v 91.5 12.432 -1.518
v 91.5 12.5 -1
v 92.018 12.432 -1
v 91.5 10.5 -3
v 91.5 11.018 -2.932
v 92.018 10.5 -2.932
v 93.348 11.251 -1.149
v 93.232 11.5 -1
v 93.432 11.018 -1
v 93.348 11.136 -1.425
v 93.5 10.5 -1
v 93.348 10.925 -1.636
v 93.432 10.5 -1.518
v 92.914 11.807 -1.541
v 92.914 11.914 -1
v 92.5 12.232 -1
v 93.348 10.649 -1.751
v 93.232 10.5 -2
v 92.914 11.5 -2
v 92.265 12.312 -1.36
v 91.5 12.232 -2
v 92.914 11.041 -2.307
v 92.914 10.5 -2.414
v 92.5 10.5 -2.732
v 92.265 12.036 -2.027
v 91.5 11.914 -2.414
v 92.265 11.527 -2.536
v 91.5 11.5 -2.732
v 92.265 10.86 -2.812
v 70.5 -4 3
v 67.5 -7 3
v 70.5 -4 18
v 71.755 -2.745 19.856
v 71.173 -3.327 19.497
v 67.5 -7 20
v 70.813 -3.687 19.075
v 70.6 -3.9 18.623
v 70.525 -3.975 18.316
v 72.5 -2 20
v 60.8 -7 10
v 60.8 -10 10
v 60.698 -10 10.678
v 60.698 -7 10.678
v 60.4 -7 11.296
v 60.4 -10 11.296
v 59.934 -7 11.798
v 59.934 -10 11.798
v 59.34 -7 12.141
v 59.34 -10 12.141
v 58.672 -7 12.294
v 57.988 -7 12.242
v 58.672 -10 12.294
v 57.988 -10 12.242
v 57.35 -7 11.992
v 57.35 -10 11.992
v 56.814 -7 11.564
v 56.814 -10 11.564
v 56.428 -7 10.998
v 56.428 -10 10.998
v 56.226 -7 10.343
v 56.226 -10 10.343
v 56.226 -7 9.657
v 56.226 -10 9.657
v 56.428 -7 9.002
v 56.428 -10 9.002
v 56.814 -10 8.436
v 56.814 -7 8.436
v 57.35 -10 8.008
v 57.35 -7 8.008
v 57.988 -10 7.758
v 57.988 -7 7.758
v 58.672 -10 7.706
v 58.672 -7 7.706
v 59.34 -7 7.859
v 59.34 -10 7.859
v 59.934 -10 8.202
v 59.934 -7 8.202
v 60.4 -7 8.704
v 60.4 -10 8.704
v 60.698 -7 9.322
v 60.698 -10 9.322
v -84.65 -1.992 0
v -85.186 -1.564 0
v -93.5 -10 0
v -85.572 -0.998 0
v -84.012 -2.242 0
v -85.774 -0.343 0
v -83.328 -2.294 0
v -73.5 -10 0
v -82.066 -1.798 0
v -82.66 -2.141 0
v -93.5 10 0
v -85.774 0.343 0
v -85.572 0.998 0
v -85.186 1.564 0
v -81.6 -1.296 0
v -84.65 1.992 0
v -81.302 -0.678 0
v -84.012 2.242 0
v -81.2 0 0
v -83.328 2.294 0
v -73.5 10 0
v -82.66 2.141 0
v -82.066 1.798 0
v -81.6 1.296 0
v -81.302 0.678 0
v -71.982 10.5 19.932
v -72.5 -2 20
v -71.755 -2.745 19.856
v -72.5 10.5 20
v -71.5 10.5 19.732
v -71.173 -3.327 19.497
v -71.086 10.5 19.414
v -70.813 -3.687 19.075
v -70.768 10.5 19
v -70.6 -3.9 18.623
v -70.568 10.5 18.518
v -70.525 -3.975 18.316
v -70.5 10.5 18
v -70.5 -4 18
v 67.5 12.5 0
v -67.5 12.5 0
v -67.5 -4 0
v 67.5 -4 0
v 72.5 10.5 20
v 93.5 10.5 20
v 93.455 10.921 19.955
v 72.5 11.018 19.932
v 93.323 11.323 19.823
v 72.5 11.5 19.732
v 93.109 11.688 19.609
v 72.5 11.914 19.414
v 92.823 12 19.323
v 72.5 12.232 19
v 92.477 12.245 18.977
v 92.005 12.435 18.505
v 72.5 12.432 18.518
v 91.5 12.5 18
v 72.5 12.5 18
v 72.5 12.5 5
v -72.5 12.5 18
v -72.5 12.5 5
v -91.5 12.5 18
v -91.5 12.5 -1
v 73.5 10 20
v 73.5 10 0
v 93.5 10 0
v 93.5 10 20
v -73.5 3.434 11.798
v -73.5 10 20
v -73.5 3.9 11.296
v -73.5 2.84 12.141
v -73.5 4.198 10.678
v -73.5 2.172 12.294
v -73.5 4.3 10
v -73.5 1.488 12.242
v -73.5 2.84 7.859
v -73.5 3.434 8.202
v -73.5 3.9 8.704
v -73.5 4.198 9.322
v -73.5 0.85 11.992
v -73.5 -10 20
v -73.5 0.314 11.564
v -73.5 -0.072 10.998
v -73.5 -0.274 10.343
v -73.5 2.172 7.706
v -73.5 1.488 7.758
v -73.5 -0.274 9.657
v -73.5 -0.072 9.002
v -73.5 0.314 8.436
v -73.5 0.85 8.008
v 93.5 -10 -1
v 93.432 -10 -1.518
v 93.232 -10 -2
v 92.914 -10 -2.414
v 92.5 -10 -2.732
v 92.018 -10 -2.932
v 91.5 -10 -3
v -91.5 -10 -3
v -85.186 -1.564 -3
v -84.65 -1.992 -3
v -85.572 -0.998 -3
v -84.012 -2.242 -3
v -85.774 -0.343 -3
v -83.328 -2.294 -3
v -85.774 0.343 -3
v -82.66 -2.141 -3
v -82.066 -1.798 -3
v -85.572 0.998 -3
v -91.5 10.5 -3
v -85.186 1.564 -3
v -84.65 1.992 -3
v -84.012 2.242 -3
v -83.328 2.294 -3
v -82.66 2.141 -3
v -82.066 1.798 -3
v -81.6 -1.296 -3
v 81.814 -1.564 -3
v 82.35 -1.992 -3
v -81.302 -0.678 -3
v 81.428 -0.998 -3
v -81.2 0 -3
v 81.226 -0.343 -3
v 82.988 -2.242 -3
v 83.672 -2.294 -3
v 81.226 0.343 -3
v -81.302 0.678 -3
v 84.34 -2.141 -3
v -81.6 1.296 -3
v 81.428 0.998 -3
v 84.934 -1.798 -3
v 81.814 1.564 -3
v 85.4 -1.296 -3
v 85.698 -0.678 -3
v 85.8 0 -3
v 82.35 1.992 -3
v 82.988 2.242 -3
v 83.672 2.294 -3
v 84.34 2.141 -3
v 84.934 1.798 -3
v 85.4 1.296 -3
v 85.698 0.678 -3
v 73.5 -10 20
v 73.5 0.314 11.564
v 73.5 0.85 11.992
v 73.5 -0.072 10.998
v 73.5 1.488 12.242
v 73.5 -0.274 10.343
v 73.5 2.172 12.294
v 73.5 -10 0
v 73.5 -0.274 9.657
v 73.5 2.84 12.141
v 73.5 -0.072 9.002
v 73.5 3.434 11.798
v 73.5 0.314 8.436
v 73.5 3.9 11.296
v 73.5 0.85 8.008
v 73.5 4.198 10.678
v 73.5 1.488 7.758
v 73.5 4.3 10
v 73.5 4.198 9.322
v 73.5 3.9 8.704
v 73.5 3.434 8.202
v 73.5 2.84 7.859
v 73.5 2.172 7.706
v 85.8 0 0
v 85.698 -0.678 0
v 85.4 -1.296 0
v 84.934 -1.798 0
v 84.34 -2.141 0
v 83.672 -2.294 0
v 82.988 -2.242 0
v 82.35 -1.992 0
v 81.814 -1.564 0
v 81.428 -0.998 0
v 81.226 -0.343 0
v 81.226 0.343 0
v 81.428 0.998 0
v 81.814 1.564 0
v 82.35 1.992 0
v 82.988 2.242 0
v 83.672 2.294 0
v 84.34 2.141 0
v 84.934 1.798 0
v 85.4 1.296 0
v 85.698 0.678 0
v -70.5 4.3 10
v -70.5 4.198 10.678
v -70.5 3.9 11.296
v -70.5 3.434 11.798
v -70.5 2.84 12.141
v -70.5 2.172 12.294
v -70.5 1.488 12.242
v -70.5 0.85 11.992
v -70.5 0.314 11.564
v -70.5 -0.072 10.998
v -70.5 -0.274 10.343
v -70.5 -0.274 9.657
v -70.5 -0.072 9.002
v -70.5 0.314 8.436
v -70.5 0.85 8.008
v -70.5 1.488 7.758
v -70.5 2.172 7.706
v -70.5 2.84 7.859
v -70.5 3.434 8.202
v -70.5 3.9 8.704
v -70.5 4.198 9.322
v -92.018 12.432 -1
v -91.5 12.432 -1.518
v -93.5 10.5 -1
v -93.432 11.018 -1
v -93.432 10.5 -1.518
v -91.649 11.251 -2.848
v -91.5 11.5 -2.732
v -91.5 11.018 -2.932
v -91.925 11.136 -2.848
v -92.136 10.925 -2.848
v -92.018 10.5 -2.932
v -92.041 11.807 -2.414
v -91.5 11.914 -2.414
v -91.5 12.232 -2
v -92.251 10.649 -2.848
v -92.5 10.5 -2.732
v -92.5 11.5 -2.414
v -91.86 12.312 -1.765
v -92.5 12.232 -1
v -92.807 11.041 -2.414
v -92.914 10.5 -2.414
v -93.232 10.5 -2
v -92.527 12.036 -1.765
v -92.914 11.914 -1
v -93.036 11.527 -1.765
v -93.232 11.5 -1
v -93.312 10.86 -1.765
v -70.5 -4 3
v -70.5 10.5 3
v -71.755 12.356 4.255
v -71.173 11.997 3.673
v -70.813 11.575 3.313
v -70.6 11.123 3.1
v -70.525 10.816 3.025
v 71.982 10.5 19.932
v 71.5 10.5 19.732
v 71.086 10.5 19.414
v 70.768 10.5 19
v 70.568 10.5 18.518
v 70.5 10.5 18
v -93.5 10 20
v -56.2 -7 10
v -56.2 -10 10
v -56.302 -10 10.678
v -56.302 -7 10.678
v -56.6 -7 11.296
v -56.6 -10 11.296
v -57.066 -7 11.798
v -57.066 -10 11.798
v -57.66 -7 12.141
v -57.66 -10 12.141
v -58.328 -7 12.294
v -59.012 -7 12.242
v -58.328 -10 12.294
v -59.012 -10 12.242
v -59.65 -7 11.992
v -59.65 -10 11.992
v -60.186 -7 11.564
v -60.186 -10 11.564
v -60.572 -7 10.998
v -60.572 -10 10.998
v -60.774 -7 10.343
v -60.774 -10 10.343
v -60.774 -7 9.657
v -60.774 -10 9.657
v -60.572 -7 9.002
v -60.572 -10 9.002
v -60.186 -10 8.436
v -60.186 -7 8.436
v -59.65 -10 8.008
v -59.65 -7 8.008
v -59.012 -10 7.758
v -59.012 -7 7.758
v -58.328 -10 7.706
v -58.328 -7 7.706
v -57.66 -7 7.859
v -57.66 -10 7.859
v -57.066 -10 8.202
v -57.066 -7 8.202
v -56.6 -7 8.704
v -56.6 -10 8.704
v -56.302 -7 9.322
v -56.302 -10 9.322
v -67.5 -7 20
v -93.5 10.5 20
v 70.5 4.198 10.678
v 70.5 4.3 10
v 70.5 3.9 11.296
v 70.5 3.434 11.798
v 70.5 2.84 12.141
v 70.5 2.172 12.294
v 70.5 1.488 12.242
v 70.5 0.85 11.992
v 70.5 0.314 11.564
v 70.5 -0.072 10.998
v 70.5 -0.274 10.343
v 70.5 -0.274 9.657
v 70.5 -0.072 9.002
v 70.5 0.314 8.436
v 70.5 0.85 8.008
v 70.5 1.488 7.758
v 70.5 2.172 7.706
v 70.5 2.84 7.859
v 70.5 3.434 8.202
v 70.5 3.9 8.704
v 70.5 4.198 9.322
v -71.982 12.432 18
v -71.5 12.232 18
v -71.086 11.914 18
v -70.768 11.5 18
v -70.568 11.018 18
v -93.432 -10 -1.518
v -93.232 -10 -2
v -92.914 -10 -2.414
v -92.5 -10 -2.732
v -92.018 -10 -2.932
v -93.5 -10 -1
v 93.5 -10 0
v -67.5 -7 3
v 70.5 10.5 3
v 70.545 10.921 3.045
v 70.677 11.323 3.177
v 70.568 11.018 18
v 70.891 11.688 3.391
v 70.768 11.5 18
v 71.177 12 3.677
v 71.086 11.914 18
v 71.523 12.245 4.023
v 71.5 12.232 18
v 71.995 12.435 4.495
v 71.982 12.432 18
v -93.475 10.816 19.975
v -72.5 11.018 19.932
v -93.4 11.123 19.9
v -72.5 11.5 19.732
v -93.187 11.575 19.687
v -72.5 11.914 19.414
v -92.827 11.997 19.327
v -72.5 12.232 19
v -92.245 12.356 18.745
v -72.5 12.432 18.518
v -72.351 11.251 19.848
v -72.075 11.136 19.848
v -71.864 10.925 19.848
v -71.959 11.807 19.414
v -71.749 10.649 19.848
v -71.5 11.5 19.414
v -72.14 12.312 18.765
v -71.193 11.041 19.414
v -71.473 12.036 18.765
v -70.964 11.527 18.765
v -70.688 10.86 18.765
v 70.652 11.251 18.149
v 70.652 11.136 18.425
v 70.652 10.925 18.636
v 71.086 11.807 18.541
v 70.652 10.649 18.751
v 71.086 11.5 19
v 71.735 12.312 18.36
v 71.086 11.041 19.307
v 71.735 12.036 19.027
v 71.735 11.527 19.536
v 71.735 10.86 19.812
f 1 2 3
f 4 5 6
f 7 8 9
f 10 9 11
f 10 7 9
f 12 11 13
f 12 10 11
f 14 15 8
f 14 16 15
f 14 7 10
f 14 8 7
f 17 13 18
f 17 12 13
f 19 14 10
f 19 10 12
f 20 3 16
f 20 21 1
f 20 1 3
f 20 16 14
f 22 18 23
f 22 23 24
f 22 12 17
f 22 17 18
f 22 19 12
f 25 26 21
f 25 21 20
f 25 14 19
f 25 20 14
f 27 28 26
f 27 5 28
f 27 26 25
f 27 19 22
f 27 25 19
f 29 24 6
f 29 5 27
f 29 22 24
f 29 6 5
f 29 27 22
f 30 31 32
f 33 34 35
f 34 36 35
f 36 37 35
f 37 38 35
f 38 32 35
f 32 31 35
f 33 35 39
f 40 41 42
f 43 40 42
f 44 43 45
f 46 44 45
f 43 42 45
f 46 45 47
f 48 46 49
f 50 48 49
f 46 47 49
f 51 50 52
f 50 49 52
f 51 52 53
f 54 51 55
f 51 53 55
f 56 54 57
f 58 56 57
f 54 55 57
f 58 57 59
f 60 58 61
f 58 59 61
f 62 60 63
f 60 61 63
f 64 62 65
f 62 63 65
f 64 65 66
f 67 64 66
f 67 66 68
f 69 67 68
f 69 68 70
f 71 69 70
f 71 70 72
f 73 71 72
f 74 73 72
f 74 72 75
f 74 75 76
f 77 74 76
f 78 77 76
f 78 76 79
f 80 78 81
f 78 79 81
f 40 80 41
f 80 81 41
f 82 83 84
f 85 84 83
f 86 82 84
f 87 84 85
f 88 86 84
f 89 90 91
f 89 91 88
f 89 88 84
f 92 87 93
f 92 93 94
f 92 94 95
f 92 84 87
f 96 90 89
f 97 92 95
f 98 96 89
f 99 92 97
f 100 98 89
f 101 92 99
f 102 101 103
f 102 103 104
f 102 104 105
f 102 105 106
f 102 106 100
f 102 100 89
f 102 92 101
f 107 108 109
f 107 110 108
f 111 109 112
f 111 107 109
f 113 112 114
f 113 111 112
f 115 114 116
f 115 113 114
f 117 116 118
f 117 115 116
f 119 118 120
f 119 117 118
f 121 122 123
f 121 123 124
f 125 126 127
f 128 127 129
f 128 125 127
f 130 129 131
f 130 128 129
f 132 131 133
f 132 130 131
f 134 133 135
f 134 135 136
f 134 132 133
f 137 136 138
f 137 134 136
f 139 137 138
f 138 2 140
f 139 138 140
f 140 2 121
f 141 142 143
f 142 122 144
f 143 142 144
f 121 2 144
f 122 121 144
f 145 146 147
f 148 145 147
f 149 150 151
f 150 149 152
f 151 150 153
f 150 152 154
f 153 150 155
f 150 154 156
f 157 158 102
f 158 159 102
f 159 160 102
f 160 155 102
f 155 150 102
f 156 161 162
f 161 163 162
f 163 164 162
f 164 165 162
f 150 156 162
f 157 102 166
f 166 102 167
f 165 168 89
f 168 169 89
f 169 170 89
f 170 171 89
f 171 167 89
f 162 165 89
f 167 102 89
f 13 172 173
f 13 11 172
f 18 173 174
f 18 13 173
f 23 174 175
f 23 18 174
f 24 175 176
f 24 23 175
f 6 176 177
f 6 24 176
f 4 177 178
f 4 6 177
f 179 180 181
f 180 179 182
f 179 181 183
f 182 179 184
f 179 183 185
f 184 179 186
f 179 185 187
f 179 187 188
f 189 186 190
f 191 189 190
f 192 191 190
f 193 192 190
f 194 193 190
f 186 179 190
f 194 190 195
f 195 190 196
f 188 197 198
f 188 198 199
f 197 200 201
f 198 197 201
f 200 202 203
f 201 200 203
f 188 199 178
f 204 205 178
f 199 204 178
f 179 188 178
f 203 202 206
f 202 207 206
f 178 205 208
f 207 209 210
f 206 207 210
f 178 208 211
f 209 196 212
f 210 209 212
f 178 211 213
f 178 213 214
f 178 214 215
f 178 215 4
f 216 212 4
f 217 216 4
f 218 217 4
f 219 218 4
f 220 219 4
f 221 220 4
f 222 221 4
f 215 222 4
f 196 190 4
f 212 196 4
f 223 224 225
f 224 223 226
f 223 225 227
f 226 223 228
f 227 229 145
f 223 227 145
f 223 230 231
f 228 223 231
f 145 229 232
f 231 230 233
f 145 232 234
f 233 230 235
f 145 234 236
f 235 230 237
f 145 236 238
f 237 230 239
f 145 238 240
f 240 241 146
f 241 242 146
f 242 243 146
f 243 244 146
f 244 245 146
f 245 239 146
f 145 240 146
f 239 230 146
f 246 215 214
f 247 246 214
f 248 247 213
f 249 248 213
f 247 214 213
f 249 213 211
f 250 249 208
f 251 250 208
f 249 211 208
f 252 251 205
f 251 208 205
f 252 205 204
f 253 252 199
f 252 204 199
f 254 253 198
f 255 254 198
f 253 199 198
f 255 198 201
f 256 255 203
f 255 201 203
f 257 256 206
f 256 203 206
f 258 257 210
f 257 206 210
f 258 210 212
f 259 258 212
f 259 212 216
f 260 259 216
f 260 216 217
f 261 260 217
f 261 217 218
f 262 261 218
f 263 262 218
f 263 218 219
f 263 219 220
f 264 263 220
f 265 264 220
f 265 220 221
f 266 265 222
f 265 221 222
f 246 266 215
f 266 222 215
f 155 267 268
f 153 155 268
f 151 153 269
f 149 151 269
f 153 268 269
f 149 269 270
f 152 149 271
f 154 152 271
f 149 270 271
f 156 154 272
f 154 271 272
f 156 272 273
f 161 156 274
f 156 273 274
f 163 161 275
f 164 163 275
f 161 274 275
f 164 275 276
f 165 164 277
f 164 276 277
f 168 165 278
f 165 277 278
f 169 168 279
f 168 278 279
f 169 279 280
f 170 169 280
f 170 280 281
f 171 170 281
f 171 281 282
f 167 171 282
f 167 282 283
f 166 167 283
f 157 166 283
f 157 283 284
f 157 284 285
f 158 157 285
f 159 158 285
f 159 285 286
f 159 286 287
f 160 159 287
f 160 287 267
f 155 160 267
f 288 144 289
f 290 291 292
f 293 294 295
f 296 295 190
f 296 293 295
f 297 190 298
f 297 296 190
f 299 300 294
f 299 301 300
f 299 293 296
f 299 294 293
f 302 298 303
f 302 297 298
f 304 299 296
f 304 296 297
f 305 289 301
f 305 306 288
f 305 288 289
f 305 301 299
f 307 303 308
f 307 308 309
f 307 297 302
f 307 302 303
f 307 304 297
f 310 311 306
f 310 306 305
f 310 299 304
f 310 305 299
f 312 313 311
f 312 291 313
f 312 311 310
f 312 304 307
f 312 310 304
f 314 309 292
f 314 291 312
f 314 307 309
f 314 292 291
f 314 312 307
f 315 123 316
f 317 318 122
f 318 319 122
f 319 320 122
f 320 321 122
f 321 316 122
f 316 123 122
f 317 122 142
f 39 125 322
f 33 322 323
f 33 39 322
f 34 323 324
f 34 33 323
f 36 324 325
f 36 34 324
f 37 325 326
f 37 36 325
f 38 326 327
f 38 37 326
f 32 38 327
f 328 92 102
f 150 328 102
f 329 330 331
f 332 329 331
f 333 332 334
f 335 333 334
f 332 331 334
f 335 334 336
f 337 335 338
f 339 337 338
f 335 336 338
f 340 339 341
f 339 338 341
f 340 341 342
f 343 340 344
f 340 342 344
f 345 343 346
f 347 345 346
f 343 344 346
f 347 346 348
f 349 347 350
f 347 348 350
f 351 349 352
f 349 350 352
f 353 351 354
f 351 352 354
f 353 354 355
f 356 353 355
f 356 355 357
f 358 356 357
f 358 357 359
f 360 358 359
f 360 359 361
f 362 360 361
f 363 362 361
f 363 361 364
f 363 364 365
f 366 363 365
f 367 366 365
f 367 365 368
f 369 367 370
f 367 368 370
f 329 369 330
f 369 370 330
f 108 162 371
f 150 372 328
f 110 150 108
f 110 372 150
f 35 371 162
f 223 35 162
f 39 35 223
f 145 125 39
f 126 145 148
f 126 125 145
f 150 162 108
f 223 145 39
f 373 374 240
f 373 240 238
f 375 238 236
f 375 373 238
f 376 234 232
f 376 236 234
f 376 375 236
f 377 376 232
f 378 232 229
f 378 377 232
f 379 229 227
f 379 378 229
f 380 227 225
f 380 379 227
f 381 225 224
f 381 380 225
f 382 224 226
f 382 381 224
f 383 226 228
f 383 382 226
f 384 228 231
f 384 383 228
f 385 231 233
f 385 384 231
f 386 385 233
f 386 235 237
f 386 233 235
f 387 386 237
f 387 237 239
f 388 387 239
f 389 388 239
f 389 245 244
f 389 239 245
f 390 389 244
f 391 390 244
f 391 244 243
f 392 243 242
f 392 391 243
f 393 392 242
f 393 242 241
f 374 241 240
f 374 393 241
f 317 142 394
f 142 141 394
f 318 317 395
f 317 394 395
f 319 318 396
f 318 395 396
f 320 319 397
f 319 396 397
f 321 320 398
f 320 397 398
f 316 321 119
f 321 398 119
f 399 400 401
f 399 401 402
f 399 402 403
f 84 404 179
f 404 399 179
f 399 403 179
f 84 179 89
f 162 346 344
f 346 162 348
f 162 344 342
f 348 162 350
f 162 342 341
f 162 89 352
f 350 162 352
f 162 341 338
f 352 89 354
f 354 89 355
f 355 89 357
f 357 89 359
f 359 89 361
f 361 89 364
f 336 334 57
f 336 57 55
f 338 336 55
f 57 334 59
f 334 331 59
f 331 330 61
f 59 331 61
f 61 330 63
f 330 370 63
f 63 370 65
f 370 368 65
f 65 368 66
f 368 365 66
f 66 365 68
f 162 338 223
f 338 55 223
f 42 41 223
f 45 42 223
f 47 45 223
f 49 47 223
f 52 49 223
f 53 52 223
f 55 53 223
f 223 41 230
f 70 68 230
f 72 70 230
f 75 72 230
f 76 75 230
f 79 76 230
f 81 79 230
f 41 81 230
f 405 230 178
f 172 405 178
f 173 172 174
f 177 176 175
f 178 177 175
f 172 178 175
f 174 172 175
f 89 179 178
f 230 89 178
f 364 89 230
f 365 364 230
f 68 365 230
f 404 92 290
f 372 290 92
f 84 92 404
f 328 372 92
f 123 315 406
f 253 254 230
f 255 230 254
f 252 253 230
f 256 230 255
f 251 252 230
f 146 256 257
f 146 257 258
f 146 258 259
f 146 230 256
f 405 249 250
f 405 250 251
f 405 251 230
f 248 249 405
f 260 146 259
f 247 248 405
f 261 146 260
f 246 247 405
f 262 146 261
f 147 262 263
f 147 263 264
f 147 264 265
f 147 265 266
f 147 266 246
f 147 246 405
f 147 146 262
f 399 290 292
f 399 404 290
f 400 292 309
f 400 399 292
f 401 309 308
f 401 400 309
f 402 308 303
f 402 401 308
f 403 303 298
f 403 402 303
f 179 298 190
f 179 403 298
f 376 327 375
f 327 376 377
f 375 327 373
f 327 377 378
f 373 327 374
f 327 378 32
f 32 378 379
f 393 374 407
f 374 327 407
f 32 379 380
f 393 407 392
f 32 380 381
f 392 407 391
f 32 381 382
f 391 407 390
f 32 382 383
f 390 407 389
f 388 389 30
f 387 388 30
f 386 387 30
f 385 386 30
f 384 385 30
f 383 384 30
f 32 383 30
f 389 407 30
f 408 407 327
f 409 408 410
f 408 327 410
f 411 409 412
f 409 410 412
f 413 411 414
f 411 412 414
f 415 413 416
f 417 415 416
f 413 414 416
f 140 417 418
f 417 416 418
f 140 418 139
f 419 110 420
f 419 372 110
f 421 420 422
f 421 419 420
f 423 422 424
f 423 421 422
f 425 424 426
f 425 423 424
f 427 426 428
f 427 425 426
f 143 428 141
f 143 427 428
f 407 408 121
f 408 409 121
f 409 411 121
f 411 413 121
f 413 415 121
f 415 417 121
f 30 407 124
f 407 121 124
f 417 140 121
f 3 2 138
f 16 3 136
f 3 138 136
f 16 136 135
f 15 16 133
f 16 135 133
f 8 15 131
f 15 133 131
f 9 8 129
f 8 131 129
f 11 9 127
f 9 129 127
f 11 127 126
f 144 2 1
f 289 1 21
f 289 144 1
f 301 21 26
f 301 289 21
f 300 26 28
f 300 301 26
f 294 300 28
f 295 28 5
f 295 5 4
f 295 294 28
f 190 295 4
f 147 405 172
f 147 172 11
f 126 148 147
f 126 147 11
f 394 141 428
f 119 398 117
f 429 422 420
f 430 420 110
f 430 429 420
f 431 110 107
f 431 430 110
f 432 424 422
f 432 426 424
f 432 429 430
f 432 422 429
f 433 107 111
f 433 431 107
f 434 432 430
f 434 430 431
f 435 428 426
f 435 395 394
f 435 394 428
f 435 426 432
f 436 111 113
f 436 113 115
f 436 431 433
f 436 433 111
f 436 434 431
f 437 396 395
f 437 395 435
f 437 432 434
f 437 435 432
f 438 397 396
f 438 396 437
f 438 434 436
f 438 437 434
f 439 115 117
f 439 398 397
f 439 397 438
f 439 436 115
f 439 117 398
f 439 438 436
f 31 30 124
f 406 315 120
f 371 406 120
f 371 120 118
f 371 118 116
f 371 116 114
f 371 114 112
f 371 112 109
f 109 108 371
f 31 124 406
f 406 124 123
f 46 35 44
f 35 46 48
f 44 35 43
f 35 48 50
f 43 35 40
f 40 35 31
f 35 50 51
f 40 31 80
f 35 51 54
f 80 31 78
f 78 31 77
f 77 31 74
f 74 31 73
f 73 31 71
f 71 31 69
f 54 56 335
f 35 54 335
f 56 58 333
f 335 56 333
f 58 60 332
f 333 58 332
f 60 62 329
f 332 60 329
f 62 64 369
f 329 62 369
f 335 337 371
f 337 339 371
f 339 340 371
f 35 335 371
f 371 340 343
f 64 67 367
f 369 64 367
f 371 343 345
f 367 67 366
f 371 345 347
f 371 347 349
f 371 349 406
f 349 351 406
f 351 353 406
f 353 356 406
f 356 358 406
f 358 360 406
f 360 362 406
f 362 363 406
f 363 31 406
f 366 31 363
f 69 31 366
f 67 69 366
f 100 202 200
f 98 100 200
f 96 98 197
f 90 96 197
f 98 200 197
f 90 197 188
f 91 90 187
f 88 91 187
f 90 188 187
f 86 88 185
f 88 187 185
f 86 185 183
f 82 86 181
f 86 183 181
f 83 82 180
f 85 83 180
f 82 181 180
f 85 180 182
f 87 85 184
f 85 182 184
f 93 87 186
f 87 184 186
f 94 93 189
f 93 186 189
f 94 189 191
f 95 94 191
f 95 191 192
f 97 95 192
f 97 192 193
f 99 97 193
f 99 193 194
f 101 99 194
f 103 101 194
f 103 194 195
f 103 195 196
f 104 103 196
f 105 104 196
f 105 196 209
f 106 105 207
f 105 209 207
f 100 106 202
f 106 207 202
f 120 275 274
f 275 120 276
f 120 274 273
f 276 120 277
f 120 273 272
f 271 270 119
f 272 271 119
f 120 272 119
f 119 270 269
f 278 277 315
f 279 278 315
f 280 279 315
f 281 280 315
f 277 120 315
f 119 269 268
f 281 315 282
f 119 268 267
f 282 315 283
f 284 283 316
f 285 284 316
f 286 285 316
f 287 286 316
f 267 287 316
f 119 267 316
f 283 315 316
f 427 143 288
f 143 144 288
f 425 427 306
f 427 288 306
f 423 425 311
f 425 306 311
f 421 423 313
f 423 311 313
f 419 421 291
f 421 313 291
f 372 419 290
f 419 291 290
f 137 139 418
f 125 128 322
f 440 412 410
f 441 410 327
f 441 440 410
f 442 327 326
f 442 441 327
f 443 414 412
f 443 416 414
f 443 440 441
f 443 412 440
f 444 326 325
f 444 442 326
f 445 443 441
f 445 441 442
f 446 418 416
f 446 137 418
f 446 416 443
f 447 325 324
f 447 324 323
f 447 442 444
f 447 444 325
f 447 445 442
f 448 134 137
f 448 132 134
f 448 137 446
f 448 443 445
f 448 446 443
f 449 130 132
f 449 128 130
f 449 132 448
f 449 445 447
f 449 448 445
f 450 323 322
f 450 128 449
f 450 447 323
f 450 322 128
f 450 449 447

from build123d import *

# Parameters (mm, degrees)
F0_W          = 141
F0_H          = 17
F0_W_2        = 20
F0_H_2        = 20
F0_H_3        = 2.5
F8_DEPTH      = 3
F1_DEPTH      = 20
F9_R          = 2.3
F10_DEPTH     = 3
F2_R          = 2.3
F3_DEPTH      = 164.001
F3_DEPTH_BACK = 23.001
F4_R          = 2.3
F5_DEPTH      = 3
F6_SIZE       = 3
F7_R          = 2


with BuildPart() as f8:
    # F0 (on Top) → F8 (new body)
    with BuildSketch(Plane.XY):
        with Locations((0, 1.5)):
            Rectangle(F0_W, F0_H)
        Polygon((-73.5, -10), (73.5, -10), (73.5, 10), (70.5, 10), (70.5, -7), (-70.5, -7), (-70.5, 10), (-73.5, 10), align=None)
        with Locations((-83.5, 0)):
            Rectangle(F0_W_2, F0_H_2)
        Polygon((-93.5, 10), (-73.5, 10), (-70.5, 10), (-70.5, 12.5), (-93.5, 12.5), align=None)
        with Locations((83.5, 0)):
            Rectangle(F0_W_2, F0_H_2)
        Polygon((73.5, 10), (93.5, 10), (93.5, 12.5), (70.5, 12.5), (70.5, 10), align=None)
        with Locations((0, 11.25)):
            Rectangle(F0_W, F0_H_3)
    extrude(amount=-F8_DEPTH)

    # F0 (on Top) → F1 (join)
    with BuildSketch(Plane.XY):
        Polygon((-73.5, -10), (73.5, -10), (73.5, 10), (70.5, 10), (70.5, -7), (-70.5, -7), (-70.5, 10), (-73.5, 10), align=None)
        Polygon((-93.5, 10), (-73.5, 10), (-70.5, 10), (-70.5, 12.5), (-93.5, 12.5), align=None)
        Polygon((73.5, 10), (93.5, 10), (93.5, 12.5), (70.5, 12.5), (70.5, 10), align=None)
    extrude(amount=F1_DEPTH)

    # F9 (on face) → F10 (cut, through all)
    with BuildSketch(Plane(origin=(0, 0, -3), x_dir=(1, 0, 0), z_dir=(0, 0, -1))):
        with Locations((-83.5, 0)):
            Circle(F9_R)
        with Locations((83.5, 0)):
            Circle(F9_R)
    extrude(amount=-F10_DEPTH, mode=Mode.SUBTRACT)

    # F2 (on face) → F3 (cut, two sides)
    with BuildSketch(Plane.YZ.offset(-70.5)) as f3_sk:
        with Locations((2, 10)):
            Circle(F2_R)
    extrude(amount=F3_DEPTH, mode=Mode.SUBTRACT)
    extrude(f3_sk.sketch, amount=-F3_DEPTH_BACK, mode=Mode.SUBTRACT)

    # F4 (on face) → F5 (cut, through all)
    with BuildSketch(Plane.XZ.offset(10)):
        with Locations((-58.5, 10)):
            Circle(F4_R)
        with Locations((58.5, 10)):
            Circle(F4_R)
    extrude(amount=-F5_DEPTH, mode=Mode.SUBTRACT)

    # F6
    f6_edges = [f8.edges().sort_by_distance(p)[0] for p in [
        (70.5, -7, 10),
        (70.5, 2.75, 0),
        (-70.5, -7, 10),
        (-70.5, 2.75, 0),
        (0, -7, 0),
    ]]
    chamfer(f6_edges, length=F6_SIZE)

    # F7
    f7_edges = [f8.edges().sort_by_distance(p)[0] for p in [
        (-93.5, 12.5, 8.5),
        (-70.5, 12.5, 11.5),
        (0, 12.5, -3),
        (-82, 12.5, 20),
        (82, 12.5, 20),
        (93.5, 12.5, 8.5),
        (70.5, 12.5, 11.5),
        (93.5, 1.25, -3),
        (-93.5, 1.25, -3),
        (-70.5, 4.25, 20),
        (70.5, 4.25, 20),
    ]]
    fillet(f7_edges, radius=F7_R)


solid = f8.part
